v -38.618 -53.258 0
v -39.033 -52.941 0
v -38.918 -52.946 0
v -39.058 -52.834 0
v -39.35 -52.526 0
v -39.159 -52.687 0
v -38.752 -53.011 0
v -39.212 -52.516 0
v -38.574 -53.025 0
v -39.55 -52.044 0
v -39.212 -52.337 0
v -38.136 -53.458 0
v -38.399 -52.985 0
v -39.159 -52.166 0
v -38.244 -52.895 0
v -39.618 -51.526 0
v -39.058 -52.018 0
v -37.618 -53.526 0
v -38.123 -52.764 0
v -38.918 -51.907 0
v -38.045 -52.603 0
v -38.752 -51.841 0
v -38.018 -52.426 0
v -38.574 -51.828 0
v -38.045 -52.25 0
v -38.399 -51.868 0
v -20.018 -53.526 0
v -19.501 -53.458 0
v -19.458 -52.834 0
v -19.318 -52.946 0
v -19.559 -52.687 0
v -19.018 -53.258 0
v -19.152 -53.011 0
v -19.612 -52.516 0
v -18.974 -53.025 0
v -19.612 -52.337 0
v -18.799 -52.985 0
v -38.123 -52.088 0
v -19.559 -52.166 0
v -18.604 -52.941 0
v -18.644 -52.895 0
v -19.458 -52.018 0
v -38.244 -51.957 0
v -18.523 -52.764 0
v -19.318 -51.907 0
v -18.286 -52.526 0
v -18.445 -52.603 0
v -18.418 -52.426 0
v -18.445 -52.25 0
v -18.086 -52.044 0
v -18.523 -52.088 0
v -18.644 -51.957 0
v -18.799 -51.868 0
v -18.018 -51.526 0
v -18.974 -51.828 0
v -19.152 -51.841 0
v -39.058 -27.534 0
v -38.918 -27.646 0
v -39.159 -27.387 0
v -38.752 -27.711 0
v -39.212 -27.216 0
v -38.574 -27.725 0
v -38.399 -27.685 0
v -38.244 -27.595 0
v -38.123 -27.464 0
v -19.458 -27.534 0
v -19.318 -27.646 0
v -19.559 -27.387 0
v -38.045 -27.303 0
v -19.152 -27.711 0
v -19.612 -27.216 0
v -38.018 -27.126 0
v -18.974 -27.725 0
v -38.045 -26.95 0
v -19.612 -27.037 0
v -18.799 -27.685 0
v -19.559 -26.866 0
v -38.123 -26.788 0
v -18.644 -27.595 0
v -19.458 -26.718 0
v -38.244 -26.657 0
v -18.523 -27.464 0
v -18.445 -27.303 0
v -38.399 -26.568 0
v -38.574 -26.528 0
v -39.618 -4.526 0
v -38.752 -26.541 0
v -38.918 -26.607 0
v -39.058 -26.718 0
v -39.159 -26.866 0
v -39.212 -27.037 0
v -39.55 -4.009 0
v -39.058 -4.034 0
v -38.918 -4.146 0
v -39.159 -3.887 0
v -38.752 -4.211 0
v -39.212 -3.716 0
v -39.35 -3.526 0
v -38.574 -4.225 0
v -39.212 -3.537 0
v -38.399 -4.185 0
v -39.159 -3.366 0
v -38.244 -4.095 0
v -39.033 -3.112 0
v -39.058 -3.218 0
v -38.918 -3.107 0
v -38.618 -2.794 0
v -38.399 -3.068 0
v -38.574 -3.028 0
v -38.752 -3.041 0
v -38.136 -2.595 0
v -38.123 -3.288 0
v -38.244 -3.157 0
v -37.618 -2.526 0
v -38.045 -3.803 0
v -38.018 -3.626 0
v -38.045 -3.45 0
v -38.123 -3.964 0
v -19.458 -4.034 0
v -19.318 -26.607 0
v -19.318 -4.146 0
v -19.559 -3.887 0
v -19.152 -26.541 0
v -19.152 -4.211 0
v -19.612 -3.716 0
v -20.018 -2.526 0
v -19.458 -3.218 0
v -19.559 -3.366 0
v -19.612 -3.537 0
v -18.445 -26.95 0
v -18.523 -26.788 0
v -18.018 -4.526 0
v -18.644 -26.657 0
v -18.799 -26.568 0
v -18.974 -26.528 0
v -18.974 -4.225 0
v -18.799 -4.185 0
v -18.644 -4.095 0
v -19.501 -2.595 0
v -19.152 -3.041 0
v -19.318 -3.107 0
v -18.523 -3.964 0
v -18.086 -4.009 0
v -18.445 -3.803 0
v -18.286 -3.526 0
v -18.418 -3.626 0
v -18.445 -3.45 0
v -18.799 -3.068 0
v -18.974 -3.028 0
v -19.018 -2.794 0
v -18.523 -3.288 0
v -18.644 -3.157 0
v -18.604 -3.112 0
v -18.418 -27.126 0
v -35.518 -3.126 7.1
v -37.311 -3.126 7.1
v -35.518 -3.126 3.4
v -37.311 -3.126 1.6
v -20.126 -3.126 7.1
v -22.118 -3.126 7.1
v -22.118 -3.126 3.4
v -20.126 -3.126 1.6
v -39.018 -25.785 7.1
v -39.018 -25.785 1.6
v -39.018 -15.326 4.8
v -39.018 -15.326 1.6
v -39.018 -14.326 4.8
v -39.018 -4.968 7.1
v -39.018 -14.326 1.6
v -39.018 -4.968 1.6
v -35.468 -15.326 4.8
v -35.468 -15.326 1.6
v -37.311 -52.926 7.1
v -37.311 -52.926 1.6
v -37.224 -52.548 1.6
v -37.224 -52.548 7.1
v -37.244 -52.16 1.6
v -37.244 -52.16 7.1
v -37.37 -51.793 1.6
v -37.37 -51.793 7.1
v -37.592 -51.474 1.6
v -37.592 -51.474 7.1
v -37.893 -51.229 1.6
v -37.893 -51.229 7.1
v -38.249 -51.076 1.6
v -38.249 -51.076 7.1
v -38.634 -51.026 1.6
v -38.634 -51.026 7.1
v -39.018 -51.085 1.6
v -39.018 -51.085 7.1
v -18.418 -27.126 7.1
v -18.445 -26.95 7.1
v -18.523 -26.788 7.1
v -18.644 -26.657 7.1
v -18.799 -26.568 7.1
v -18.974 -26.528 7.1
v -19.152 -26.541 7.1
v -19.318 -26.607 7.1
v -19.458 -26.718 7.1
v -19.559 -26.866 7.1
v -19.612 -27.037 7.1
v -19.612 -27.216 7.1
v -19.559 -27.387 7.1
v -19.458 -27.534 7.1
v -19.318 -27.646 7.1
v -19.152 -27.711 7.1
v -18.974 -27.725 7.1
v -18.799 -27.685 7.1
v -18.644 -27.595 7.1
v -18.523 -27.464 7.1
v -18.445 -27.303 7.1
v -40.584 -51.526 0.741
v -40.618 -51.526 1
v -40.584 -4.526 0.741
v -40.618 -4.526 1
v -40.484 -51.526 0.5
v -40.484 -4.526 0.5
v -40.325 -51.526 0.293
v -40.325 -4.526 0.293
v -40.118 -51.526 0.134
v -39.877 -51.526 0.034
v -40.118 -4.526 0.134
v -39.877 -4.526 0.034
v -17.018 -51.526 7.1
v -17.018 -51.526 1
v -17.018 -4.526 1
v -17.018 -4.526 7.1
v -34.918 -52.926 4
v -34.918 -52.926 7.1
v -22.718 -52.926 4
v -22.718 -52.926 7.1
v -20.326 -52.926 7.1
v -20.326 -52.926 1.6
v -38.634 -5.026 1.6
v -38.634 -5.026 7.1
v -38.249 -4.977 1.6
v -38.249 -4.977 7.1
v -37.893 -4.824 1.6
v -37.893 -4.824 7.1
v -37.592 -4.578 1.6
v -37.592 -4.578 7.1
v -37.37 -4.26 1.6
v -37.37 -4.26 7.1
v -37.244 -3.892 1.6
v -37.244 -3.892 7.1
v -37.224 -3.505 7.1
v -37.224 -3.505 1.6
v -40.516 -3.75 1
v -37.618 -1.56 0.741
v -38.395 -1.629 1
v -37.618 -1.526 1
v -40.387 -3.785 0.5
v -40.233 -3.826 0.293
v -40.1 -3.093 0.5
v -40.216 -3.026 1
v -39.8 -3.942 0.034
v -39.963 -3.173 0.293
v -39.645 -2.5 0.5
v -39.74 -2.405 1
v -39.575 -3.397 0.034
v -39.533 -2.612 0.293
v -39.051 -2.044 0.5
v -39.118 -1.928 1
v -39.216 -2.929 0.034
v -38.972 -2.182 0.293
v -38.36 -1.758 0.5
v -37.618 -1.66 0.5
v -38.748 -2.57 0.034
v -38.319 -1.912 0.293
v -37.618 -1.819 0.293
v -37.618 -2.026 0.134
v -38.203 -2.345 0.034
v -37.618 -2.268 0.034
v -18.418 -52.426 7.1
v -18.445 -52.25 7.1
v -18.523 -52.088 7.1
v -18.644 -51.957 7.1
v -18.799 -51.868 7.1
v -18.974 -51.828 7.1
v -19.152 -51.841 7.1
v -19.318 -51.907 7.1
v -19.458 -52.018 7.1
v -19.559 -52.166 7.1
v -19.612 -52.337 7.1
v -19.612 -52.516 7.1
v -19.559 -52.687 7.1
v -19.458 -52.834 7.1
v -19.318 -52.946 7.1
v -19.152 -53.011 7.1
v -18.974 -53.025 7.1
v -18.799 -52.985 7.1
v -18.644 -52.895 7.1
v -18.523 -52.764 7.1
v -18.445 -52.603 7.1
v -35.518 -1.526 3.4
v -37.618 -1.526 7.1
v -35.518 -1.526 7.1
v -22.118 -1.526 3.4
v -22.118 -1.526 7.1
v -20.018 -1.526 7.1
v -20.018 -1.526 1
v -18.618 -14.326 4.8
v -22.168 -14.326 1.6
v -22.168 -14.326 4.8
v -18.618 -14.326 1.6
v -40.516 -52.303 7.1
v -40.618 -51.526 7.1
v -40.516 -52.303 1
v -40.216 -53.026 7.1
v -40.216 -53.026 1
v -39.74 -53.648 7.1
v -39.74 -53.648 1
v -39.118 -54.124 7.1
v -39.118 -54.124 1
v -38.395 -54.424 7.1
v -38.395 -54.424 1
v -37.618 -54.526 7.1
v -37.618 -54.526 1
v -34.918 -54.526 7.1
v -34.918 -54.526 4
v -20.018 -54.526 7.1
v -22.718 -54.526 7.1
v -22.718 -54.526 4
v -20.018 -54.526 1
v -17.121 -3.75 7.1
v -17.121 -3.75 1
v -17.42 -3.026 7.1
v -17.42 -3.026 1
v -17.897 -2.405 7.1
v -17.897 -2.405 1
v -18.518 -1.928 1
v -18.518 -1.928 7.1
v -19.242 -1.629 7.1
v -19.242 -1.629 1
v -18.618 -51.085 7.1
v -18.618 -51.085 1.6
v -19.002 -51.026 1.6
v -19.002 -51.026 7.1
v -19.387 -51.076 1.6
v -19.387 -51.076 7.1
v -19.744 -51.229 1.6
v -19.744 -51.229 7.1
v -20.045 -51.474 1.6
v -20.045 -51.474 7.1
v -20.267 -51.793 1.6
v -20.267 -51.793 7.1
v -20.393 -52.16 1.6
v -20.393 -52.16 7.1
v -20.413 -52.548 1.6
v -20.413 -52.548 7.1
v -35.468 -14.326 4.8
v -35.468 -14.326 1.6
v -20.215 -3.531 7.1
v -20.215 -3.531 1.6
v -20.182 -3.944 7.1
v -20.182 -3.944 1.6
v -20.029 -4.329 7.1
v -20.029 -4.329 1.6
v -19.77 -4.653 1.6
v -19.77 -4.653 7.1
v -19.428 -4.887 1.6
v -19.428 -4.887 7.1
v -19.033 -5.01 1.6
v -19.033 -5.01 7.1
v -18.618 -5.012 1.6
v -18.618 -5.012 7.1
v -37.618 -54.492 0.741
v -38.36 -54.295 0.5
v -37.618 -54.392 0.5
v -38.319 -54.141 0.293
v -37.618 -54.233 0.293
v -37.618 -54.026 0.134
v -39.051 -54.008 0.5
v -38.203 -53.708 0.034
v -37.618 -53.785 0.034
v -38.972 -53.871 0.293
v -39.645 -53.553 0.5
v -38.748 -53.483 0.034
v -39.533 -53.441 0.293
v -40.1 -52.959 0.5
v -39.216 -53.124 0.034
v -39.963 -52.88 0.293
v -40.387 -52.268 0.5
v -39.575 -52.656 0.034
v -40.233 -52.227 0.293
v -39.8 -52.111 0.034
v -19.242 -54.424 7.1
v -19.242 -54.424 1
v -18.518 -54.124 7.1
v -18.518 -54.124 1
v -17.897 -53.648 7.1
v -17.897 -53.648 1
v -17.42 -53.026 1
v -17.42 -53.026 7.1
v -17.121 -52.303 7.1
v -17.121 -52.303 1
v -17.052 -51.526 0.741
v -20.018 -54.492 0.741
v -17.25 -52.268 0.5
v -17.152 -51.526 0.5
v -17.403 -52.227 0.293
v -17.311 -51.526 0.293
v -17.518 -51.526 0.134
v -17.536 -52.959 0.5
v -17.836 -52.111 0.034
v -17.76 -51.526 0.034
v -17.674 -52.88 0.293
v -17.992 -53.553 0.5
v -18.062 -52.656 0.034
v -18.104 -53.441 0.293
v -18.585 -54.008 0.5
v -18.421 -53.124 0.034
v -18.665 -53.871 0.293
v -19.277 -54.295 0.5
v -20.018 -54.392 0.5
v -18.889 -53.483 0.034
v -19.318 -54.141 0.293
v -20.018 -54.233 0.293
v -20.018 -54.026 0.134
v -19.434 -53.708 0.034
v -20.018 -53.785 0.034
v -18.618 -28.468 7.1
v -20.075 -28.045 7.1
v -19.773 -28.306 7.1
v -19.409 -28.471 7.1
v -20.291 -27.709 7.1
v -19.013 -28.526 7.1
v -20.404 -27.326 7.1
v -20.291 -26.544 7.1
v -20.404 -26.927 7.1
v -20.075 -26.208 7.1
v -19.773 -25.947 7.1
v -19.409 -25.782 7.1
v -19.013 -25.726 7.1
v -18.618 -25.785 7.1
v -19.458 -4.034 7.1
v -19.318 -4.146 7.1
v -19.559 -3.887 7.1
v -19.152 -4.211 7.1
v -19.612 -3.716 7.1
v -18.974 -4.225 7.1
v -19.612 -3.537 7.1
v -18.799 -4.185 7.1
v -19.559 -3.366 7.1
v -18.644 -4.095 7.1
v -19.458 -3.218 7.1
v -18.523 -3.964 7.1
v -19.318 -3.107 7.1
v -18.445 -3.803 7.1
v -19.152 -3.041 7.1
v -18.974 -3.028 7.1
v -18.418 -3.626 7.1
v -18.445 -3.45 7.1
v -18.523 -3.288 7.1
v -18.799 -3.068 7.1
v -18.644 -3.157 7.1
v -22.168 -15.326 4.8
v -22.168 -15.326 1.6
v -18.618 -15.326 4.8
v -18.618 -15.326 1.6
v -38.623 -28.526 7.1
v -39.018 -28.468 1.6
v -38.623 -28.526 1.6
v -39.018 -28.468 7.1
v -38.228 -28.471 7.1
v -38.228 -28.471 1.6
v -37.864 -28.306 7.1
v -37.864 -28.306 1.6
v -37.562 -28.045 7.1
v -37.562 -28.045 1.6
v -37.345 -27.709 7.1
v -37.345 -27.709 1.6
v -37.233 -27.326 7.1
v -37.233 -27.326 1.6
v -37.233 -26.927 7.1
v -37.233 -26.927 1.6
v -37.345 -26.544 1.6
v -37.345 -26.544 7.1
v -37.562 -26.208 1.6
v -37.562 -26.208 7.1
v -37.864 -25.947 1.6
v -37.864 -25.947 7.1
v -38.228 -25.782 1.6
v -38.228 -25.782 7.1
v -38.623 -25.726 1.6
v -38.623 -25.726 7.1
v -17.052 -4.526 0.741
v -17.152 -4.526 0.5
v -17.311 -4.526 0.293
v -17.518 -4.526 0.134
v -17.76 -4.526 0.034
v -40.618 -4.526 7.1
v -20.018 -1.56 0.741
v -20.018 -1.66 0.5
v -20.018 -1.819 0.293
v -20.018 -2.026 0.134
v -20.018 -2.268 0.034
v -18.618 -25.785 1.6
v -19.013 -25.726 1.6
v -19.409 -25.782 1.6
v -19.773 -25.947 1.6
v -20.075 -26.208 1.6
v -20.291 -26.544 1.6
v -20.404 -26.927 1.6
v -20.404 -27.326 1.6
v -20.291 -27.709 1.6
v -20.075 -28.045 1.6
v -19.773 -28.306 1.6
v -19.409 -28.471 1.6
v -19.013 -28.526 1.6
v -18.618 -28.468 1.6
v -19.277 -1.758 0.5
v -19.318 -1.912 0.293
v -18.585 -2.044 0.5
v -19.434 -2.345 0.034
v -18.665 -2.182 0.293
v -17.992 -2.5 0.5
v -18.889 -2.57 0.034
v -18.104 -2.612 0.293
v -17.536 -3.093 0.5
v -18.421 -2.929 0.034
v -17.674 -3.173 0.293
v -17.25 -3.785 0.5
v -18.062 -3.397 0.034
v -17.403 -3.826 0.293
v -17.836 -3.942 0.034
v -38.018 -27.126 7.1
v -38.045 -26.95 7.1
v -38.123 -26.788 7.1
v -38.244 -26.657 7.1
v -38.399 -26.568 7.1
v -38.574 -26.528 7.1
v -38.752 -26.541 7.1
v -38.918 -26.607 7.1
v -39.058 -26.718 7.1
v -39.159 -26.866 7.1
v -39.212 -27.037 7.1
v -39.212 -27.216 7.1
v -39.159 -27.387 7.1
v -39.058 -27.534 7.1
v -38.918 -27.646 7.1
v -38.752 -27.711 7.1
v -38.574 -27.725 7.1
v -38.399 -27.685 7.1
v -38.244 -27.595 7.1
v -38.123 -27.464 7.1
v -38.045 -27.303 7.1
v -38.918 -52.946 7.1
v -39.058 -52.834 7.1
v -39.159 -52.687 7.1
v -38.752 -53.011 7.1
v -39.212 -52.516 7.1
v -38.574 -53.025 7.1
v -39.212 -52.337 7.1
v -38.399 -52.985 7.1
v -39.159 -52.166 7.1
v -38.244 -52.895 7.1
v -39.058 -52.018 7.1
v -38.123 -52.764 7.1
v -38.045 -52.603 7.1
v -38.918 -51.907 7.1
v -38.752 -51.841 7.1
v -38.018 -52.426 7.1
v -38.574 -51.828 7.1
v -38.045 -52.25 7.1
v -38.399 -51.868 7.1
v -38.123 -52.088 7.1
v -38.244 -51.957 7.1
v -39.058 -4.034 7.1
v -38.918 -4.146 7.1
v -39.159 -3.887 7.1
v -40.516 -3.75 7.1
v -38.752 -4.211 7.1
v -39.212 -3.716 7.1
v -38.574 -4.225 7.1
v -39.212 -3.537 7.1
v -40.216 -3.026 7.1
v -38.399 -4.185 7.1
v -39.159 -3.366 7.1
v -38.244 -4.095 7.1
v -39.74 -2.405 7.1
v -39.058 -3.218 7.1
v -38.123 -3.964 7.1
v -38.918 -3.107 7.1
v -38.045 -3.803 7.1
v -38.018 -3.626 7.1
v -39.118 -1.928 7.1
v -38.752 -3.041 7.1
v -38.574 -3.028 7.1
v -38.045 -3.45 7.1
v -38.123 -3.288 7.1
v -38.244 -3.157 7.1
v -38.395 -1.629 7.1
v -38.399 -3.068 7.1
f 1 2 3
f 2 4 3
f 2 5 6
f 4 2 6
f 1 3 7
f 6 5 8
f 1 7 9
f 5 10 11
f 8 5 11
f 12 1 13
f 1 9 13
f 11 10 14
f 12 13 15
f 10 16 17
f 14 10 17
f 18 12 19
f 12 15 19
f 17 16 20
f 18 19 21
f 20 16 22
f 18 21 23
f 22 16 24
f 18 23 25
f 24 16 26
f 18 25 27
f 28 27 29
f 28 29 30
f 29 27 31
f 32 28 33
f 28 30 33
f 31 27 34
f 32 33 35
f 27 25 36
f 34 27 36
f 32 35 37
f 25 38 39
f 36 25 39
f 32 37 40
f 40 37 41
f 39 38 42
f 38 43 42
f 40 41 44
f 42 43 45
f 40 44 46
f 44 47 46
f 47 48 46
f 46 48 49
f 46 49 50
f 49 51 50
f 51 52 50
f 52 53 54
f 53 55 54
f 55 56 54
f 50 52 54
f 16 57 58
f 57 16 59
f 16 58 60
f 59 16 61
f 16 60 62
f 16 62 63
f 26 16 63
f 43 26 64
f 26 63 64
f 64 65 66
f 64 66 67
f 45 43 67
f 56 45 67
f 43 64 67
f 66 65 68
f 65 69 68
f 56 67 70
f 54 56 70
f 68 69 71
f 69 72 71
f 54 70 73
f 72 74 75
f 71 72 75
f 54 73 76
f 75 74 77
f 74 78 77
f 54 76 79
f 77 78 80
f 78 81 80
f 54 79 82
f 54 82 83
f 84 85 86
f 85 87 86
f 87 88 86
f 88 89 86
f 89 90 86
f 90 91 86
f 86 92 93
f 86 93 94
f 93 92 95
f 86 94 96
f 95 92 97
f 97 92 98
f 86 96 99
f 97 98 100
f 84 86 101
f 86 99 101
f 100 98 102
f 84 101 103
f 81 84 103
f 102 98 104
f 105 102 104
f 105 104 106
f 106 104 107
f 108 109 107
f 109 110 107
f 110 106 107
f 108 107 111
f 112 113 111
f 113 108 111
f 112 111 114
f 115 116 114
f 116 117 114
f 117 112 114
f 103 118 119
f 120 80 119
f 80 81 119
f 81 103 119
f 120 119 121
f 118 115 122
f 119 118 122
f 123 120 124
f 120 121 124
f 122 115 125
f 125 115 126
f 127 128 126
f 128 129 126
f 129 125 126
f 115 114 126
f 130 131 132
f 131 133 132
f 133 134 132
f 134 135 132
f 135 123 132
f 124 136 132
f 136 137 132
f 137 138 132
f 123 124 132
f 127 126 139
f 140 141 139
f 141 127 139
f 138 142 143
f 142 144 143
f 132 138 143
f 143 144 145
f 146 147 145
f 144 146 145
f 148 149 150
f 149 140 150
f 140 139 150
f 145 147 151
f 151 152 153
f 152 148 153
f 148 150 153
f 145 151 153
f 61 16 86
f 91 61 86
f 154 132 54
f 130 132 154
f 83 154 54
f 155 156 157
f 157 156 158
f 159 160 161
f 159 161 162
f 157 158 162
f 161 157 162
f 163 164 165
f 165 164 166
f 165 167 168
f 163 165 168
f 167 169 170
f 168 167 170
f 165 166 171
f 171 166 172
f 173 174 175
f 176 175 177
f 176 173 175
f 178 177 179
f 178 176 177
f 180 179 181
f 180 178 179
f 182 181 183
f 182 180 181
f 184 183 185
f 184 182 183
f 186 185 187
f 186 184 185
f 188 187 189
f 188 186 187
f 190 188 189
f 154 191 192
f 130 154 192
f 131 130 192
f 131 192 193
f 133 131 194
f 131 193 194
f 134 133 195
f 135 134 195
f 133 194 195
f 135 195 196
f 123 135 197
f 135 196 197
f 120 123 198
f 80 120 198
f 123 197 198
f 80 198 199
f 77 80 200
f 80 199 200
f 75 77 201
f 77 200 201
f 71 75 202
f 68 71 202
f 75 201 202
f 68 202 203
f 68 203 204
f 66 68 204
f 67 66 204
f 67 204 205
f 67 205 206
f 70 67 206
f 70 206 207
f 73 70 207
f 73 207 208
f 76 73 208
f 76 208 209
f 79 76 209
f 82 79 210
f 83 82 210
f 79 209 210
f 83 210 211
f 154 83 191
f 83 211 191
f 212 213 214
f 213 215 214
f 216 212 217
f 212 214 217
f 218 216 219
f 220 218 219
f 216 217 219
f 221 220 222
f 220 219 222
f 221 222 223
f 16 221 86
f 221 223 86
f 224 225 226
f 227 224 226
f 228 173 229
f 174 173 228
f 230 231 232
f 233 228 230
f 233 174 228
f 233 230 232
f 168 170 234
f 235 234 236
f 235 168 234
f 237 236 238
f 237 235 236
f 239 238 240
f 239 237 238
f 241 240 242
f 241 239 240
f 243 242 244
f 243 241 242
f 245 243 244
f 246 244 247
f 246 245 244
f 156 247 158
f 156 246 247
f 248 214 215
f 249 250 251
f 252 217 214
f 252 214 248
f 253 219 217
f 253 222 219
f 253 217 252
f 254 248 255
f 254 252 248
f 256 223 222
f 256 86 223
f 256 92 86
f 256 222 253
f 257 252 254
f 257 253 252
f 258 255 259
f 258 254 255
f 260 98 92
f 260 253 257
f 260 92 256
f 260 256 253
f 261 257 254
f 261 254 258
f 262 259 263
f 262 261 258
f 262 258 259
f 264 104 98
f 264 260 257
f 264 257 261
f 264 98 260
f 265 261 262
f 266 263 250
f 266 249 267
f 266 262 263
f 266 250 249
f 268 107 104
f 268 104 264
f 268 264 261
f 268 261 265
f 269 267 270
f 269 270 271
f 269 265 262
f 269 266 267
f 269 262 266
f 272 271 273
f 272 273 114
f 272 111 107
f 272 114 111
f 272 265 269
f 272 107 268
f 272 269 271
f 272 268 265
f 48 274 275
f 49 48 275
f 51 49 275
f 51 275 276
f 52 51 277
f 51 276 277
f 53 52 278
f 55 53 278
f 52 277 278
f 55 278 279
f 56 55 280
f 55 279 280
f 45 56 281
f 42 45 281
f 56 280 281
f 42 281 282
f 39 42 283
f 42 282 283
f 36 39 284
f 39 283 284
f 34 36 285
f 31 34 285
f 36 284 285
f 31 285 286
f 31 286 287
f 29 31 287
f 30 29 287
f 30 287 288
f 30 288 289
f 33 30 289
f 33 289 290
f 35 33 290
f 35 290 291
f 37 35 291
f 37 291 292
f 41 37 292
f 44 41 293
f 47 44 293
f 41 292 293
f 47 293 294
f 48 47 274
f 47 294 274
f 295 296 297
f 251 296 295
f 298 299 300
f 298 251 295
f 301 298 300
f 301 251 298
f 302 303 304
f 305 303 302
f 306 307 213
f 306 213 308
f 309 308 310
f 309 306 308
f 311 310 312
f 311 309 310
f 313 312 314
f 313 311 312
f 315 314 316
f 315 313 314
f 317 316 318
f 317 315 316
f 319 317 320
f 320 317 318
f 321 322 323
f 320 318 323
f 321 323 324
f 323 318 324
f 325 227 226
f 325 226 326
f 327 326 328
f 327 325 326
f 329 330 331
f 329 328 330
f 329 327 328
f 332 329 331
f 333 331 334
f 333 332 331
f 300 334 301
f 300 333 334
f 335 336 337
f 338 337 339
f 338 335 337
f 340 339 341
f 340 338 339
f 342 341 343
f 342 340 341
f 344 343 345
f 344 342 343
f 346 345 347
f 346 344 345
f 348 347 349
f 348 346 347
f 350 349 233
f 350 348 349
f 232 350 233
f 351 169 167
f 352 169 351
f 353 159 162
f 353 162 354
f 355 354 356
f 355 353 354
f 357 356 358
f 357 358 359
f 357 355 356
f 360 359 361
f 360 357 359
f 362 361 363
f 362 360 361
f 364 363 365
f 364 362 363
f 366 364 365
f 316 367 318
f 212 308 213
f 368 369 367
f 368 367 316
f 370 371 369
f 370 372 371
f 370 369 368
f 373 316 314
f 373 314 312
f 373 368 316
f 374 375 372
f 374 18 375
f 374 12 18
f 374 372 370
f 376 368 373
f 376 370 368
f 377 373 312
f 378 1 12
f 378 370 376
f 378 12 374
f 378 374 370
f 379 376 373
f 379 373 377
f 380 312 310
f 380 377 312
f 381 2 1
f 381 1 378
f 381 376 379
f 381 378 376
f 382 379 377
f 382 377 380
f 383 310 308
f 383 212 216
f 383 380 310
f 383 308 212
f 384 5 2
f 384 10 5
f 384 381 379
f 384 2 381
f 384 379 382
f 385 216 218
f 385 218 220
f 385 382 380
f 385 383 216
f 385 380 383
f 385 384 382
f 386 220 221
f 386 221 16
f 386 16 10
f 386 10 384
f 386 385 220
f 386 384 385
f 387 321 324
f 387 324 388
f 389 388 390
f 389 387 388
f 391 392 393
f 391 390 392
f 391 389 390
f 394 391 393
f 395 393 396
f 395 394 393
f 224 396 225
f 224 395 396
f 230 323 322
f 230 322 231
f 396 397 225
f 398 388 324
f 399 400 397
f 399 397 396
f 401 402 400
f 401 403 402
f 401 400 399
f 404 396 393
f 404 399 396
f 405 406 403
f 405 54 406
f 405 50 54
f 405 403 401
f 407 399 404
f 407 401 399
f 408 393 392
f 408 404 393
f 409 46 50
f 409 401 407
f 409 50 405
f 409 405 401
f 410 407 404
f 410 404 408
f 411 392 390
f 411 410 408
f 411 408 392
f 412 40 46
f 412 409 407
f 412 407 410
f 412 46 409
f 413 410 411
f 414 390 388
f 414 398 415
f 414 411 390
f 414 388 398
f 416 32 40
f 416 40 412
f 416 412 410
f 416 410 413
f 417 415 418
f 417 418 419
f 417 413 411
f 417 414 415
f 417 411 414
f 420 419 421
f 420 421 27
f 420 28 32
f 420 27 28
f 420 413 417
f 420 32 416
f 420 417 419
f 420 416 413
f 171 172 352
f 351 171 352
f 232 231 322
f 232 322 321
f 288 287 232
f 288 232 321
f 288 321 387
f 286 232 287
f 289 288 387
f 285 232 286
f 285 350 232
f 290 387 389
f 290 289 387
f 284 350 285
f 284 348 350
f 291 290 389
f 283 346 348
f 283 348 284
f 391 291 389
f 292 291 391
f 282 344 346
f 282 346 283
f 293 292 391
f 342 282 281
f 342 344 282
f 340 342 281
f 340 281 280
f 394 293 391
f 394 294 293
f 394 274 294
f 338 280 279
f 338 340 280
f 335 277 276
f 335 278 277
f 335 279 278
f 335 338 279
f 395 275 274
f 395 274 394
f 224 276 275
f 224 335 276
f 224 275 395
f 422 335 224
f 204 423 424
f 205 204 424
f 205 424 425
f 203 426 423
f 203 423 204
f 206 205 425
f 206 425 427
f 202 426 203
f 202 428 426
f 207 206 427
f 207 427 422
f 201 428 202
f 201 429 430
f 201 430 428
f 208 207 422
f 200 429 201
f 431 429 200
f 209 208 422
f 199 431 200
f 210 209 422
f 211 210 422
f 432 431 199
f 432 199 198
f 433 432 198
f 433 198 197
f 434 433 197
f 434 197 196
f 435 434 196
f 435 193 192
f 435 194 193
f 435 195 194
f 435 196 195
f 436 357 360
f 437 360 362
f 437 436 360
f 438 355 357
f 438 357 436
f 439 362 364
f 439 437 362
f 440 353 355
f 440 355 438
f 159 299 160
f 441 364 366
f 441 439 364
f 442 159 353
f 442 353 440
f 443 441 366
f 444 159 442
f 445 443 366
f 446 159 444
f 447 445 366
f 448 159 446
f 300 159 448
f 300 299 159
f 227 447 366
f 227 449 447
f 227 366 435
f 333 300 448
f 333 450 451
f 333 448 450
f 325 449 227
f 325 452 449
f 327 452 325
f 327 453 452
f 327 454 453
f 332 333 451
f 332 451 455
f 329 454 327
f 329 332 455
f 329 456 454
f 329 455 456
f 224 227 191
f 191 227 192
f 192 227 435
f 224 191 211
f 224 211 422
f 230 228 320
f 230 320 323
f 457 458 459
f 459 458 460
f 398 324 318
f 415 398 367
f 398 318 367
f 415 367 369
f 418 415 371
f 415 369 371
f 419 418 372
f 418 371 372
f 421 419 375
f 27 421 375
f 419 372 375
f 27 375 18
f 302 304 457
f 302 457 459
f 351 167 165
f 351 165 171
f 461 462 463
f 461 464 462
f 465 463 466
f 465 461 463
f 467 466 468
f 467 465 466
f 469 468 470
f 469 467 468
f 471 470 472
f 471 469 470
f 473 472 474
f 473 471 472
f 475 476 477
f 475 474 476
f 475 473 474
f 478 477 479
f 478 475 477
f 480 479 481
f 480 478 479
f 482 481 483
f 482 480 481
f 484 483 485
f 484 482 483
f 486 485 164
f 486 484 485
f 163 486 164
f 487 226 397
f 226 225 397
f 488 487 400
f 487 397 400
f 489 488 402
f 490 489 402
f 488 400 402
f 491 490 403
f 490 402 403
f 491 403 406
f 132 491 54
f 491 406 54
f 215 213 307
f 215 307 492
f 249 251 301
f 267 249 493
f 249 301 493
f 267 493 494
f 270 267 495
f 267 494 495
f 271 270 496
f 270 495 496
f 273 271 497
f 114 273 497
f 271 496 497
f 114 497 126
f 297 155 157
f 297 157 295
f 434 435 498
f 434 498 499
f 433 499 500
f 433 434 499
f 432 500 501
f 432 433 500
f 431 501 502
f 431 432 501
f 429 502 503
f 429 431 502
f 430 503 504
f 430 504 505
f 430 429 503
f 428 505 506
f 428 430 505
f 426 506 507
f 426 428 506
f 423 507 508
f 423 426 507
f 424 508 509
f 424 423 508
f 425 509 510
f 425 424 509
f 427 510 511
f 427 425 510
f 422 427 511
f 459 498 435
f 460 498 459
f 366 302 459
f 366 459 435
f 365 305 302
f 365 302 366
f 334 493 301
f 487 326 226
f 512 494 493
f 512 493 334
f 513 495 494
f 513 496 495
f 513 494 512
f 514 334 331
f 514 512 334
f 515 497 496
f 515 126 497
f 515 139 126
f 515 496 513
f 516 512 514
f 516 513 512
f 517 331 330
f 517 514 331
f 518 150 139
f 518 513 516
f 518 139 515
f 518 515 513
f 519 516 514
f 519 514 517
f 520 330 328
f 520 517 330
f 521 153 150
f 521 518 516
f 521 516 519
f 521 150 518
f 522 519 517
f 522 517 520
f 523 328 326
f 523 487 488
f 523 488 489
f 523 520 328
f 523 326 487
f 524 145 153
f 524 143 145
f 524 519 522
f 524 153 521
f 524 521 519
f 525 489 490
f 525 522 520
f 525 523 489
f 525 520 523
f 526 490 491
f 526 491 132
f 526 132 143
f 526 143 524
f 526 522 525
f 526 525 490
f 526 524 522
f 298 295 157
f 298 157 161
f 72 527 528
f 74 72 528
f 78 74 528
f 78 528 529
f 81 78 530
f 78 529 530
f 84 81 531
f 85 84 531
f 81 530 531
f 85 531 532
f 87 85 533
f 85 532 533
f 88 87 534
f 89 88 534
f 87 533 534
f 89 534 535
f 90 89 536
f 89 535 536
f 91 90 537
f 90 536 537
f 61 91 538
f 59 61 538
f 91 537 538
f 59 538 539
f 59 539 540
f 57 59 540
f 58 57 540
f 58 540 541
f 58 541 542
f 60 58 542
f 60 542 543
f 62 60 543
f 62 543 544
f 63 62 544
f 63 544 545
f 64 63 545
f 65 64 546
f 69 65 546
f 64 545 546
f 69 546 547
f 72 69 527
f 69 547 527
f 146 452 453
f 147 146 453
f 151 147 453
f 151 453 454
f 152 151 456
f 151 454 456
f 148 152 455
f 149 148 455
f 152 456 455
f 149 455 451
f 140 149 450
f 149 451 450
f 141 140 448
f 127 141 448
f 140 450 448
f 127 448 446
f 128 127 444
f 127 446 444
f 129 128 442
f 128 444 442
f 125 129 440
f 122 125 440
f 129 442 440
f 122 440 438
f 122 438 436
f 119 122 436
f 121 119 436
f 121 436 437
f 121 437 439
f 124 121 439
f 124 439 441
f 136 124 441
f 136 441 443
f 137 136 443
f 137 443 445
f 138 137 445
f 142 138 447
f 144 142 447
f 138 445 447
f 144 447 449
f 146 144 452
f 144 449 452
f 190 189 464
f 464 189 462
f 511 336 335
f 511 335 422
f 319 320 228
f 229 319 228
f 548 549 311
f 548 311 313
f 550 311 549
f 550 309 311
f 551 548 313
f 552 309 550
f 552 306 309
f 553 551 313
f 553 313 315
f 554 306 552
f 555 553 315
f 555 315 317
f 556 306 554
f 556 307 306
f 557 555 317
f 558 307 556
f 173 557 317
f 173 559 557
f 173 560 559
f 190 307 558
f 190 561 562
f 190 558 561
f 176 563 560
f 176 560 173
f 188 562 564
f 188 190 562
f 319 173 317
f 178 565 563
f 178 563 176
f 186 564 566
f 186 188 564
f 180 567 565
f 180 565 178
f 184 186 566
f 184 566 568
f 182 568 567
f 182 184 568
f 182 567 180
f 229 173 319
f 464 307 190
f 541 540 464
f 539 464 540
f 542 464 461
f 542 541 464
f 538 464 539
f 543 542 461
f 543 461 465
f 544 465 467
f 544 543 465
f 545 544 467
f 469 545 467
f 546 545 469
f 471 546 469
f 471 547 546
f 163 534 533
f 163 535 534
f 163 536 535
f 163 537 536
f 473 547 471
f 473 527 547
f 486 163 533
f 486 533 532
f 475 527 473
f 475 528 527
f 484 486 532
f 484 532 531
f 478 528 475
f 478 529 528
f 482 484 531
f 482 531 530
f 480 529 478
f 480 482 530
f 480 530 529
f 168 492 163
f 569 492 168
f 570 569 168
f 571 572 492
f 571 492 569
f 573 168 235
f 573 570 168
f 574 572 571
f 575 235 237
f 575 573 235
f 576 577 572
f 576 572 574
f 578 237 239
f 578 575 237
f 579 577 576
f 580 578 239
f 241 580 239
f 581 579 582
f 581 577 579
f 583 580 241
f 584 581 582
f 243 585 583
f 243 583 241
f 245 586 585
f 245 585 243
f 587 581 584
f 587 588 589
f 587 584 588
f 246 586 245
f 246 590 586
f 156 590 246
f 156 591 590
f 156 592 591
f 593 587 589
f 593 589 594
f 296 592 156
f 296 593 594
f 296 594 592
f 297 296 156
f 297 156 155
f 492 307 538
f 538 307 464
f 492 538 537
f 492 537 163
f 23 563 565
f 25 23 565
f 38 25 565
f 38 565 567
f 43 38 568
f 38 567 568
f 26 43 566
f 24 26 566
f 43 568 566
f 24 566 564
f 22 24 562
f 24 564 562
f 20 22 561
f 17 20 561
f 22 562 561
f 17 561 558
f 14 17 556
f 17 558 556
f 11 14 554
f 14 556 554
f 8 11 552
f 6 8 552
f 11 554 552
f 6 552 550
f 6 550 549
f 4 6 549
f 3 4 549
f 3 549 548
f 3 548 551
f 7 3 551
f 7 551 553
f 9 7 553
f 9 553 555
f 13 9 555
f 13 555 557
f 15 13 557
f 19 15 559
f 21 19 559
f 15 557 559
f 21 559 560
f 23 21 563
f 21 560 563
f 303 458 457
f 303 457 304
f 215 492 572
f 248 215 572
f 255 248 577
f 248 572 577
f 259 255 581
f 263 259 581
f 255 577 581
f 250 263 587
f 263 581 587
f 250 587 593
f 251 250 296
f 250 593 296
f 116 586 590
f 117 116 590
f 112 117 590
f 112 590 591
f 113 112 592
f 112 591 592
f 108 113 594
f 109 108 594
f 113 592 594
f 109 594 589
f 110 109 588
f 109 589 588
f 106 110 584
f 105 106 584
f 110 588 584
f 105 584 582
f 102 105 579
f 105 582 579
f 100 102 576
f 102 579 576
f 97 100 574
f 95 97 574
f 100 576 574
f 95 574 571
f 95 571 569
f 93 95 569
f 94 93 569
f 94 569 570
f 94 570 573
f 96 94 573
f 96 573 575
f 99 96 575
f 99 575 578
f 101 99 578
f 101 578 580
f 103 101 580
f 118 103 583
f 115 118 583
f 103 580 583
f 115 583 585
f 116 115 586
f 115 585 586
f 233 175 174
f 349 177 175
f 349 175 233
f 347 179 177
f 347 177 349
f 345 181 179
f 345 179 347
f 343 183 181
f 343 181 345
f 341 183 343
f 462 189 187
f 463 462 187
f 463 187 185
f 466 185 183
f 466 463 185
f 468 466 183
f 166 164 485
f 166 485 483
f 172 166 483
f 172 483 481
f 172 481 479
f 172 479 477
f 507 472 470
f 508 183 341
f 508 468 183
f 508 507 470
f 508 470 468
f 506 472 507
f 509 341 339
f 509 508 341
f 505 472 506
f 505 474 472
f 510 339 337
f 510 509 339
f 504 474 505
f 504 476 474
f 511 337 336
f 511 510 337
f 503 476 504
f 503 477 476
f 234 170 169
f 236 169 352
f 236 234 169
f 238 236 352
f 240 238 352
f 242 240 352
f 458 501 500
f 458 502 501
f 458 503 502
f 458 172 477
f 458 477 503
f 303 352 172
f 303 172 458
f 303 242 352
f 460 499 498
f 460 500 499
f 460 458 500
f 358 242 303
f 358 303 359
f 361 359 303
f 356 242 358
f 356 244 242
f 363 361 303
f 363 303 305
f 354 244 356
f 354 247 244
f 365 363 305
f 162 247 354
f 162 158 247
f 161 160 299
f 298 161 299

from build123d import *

# Parameters (mm, degrees)
SKETCH1_W           = 23.6
SKETCH1_H           = 53
BOSS_EXTRUDE2_DEPTH = 7.1
SHELL1_T            = -1.6
FILLET2_R           = 3
SKETCH7_W           = 12.2
SKETCH7_H           = 1.6
CUT_EXTRUDE1_DEPTH  = 3.1
SKETCH8_W           = 13.4
SKETCH8_H           = 1.6
CUT_EXTRUDE2_DEPTH  = 3.7
SKETCH9_W           = 3.55
SKETCH9_H           = 1
BOSS_EXTRUDE3_DEPTH = 3.2
SKETCH10_R          = 1.4
BOSS_EXTRUDE4_DEPTH = 7.1
SKETCH11_R          = 0.6
CUT_EXTRUDE4_DEPTH  = 7.1
FILLET3_R           = 1


with BuildPart() as part:
    # Sketch1 → Boss-Extrude2 (new body)
    with BuildSketch(Plane.XY):
        with Locations((-28.818351302, -28.026390465)):
            Rectangle(SKETCH1_W, SKETCH1_H)
    extrude(amount=BOSS_EXTRUDE2_DEPTH)

    # Shell1
    shell1_openings = [part.faces().sort_by_distance(p)[0] for p in [
        (-28.818351302, -28.026390465, 7.1),
    ]]
    offset(amount=SHELL1_T, openings=shell1_openings, kind=Kind.INTERSECTION)

    # Fillet2
    fillet2_edges = [part.edges().sort_by_distance(p)[0] for p in [
        (-40.618351302, -1.526390465, 3.55),
        (-17.018351302, -1.526390465, 3.55),
        (-17.018351302, -54.526390465, 3.55),
        (-40.618351302, -54.526390465, 3.55),
    ]]
    fillet(fillet2_edges, radius=FILLET2_R)

    # Sketch7 → Cut-Extrude1 (cut)
    with BuildSketch(Plane.XY.offset(7.1)):
        with Locations((-28.818351302, -53.726390465)):
            Rectangle(SKETCH7_W, SKETCH7_H)
    extrude(amount=-CUT_EXTRUDE1_DEPTH, mode=Mode.SUBTRACT)

    # Sketch8 → Cut-Extrude2 (cut)
    with BuildSketch(Plane.XY.offset(7.1)):
        with Locations((-28.818351302, -2.326390465)):
            Rectangle(SKETCH8_W, SKETCH8_H)
    extrude(amount=-CUT_EXTRUDE2_DEPTH, mode=Mode.SUBTRACT)

    # Sketch9 → Boss-Extrude3 (add)
    with BuildSketch(Plane.XY.offset(1.6)):
        with Locations((-20.393351302, -14.826390465)):
            Rectangle(SKETCH9_W, SKETCH9_H)
        with Locations((-37.243351302, -14.826390465)):
            Rectangle(SKETCH9_W, SKETCH9_H)
    extrude(amount=BOSS_EXTRUDE3_DEPTH)

    # Sketch10 → Boss-Extrude4 (add)
    with BuildSketch(Plane.XY.offset(7.1)):
        with Locations((-38.618351302, -52.426390465)):
            Circle(SKETCH10_R)
        with Locations((-19.018351302, -52.426390465)):
            Circle(SKETCH10_R)
        with Locations((-38.618351302, -27.126390465)):
            Circle(SKETCH10_R)
        with Locations((-19.018351302, -27.126390465)):
            Circle(SKETCH10_R)
        with Locations((-18.818351302, -3.626390465)):
            Circle(SKETCH10_R)
        with Locations((-38.618351302, -3.626390465)):
            Circle(SKETCH10_R)
    extrude(amount=-BOSS_EXTRUDE4_DEPTH)

    # Sketch11 → Cut-Extrude4 (cut)
    with BuildSketch(Plane.XY.offset(7.1)):
        with Locations((-38.618351302, -3.626390465)):
            Circle(SKETCH11_R)
        with Locations((-19.018351302, -3.626390465)):
            Circle(SKETCH11_R)
        with Locations((-38.618351302, -52.426390465)):
            Circle(SKETCH11_R)
        with Locations((-19.018351302, -52.426390465)):
            Circle(SKETCH11_R)
        with Locations((-38.618351302, -27.126390465)):
            Circle(SKETCH11_R)
        with Locations((-19.018351302, -27.126390465)):
            Circle(SKETCH11_R)
    extrude(amount=-CUT_EXTRUDE4_DEPTH, mode=Mode.SUBTRACT)

    # Fillet3
    fillet3_edges = [part.edges().sort_by_distance(p)[0] for p in [
        (-28.818351302, -1.526390465, 0),
        (-40.618351302, -28.026390465, 0),
        (-17.018351302, -28.026390465, 0),
        (-28.818351302, -54.526390465, 0),
        (-39.739671646, -2.405070122, 0),
        (-39.739671646, -53.647710809, 0),
        (-17.897030959, -53.647710809, 0),
        (-17.897030959, -2.405070122, 0),
    ]]
    fillet(fillet3_edges, radius=FILLET3_R)


solid = part.part
